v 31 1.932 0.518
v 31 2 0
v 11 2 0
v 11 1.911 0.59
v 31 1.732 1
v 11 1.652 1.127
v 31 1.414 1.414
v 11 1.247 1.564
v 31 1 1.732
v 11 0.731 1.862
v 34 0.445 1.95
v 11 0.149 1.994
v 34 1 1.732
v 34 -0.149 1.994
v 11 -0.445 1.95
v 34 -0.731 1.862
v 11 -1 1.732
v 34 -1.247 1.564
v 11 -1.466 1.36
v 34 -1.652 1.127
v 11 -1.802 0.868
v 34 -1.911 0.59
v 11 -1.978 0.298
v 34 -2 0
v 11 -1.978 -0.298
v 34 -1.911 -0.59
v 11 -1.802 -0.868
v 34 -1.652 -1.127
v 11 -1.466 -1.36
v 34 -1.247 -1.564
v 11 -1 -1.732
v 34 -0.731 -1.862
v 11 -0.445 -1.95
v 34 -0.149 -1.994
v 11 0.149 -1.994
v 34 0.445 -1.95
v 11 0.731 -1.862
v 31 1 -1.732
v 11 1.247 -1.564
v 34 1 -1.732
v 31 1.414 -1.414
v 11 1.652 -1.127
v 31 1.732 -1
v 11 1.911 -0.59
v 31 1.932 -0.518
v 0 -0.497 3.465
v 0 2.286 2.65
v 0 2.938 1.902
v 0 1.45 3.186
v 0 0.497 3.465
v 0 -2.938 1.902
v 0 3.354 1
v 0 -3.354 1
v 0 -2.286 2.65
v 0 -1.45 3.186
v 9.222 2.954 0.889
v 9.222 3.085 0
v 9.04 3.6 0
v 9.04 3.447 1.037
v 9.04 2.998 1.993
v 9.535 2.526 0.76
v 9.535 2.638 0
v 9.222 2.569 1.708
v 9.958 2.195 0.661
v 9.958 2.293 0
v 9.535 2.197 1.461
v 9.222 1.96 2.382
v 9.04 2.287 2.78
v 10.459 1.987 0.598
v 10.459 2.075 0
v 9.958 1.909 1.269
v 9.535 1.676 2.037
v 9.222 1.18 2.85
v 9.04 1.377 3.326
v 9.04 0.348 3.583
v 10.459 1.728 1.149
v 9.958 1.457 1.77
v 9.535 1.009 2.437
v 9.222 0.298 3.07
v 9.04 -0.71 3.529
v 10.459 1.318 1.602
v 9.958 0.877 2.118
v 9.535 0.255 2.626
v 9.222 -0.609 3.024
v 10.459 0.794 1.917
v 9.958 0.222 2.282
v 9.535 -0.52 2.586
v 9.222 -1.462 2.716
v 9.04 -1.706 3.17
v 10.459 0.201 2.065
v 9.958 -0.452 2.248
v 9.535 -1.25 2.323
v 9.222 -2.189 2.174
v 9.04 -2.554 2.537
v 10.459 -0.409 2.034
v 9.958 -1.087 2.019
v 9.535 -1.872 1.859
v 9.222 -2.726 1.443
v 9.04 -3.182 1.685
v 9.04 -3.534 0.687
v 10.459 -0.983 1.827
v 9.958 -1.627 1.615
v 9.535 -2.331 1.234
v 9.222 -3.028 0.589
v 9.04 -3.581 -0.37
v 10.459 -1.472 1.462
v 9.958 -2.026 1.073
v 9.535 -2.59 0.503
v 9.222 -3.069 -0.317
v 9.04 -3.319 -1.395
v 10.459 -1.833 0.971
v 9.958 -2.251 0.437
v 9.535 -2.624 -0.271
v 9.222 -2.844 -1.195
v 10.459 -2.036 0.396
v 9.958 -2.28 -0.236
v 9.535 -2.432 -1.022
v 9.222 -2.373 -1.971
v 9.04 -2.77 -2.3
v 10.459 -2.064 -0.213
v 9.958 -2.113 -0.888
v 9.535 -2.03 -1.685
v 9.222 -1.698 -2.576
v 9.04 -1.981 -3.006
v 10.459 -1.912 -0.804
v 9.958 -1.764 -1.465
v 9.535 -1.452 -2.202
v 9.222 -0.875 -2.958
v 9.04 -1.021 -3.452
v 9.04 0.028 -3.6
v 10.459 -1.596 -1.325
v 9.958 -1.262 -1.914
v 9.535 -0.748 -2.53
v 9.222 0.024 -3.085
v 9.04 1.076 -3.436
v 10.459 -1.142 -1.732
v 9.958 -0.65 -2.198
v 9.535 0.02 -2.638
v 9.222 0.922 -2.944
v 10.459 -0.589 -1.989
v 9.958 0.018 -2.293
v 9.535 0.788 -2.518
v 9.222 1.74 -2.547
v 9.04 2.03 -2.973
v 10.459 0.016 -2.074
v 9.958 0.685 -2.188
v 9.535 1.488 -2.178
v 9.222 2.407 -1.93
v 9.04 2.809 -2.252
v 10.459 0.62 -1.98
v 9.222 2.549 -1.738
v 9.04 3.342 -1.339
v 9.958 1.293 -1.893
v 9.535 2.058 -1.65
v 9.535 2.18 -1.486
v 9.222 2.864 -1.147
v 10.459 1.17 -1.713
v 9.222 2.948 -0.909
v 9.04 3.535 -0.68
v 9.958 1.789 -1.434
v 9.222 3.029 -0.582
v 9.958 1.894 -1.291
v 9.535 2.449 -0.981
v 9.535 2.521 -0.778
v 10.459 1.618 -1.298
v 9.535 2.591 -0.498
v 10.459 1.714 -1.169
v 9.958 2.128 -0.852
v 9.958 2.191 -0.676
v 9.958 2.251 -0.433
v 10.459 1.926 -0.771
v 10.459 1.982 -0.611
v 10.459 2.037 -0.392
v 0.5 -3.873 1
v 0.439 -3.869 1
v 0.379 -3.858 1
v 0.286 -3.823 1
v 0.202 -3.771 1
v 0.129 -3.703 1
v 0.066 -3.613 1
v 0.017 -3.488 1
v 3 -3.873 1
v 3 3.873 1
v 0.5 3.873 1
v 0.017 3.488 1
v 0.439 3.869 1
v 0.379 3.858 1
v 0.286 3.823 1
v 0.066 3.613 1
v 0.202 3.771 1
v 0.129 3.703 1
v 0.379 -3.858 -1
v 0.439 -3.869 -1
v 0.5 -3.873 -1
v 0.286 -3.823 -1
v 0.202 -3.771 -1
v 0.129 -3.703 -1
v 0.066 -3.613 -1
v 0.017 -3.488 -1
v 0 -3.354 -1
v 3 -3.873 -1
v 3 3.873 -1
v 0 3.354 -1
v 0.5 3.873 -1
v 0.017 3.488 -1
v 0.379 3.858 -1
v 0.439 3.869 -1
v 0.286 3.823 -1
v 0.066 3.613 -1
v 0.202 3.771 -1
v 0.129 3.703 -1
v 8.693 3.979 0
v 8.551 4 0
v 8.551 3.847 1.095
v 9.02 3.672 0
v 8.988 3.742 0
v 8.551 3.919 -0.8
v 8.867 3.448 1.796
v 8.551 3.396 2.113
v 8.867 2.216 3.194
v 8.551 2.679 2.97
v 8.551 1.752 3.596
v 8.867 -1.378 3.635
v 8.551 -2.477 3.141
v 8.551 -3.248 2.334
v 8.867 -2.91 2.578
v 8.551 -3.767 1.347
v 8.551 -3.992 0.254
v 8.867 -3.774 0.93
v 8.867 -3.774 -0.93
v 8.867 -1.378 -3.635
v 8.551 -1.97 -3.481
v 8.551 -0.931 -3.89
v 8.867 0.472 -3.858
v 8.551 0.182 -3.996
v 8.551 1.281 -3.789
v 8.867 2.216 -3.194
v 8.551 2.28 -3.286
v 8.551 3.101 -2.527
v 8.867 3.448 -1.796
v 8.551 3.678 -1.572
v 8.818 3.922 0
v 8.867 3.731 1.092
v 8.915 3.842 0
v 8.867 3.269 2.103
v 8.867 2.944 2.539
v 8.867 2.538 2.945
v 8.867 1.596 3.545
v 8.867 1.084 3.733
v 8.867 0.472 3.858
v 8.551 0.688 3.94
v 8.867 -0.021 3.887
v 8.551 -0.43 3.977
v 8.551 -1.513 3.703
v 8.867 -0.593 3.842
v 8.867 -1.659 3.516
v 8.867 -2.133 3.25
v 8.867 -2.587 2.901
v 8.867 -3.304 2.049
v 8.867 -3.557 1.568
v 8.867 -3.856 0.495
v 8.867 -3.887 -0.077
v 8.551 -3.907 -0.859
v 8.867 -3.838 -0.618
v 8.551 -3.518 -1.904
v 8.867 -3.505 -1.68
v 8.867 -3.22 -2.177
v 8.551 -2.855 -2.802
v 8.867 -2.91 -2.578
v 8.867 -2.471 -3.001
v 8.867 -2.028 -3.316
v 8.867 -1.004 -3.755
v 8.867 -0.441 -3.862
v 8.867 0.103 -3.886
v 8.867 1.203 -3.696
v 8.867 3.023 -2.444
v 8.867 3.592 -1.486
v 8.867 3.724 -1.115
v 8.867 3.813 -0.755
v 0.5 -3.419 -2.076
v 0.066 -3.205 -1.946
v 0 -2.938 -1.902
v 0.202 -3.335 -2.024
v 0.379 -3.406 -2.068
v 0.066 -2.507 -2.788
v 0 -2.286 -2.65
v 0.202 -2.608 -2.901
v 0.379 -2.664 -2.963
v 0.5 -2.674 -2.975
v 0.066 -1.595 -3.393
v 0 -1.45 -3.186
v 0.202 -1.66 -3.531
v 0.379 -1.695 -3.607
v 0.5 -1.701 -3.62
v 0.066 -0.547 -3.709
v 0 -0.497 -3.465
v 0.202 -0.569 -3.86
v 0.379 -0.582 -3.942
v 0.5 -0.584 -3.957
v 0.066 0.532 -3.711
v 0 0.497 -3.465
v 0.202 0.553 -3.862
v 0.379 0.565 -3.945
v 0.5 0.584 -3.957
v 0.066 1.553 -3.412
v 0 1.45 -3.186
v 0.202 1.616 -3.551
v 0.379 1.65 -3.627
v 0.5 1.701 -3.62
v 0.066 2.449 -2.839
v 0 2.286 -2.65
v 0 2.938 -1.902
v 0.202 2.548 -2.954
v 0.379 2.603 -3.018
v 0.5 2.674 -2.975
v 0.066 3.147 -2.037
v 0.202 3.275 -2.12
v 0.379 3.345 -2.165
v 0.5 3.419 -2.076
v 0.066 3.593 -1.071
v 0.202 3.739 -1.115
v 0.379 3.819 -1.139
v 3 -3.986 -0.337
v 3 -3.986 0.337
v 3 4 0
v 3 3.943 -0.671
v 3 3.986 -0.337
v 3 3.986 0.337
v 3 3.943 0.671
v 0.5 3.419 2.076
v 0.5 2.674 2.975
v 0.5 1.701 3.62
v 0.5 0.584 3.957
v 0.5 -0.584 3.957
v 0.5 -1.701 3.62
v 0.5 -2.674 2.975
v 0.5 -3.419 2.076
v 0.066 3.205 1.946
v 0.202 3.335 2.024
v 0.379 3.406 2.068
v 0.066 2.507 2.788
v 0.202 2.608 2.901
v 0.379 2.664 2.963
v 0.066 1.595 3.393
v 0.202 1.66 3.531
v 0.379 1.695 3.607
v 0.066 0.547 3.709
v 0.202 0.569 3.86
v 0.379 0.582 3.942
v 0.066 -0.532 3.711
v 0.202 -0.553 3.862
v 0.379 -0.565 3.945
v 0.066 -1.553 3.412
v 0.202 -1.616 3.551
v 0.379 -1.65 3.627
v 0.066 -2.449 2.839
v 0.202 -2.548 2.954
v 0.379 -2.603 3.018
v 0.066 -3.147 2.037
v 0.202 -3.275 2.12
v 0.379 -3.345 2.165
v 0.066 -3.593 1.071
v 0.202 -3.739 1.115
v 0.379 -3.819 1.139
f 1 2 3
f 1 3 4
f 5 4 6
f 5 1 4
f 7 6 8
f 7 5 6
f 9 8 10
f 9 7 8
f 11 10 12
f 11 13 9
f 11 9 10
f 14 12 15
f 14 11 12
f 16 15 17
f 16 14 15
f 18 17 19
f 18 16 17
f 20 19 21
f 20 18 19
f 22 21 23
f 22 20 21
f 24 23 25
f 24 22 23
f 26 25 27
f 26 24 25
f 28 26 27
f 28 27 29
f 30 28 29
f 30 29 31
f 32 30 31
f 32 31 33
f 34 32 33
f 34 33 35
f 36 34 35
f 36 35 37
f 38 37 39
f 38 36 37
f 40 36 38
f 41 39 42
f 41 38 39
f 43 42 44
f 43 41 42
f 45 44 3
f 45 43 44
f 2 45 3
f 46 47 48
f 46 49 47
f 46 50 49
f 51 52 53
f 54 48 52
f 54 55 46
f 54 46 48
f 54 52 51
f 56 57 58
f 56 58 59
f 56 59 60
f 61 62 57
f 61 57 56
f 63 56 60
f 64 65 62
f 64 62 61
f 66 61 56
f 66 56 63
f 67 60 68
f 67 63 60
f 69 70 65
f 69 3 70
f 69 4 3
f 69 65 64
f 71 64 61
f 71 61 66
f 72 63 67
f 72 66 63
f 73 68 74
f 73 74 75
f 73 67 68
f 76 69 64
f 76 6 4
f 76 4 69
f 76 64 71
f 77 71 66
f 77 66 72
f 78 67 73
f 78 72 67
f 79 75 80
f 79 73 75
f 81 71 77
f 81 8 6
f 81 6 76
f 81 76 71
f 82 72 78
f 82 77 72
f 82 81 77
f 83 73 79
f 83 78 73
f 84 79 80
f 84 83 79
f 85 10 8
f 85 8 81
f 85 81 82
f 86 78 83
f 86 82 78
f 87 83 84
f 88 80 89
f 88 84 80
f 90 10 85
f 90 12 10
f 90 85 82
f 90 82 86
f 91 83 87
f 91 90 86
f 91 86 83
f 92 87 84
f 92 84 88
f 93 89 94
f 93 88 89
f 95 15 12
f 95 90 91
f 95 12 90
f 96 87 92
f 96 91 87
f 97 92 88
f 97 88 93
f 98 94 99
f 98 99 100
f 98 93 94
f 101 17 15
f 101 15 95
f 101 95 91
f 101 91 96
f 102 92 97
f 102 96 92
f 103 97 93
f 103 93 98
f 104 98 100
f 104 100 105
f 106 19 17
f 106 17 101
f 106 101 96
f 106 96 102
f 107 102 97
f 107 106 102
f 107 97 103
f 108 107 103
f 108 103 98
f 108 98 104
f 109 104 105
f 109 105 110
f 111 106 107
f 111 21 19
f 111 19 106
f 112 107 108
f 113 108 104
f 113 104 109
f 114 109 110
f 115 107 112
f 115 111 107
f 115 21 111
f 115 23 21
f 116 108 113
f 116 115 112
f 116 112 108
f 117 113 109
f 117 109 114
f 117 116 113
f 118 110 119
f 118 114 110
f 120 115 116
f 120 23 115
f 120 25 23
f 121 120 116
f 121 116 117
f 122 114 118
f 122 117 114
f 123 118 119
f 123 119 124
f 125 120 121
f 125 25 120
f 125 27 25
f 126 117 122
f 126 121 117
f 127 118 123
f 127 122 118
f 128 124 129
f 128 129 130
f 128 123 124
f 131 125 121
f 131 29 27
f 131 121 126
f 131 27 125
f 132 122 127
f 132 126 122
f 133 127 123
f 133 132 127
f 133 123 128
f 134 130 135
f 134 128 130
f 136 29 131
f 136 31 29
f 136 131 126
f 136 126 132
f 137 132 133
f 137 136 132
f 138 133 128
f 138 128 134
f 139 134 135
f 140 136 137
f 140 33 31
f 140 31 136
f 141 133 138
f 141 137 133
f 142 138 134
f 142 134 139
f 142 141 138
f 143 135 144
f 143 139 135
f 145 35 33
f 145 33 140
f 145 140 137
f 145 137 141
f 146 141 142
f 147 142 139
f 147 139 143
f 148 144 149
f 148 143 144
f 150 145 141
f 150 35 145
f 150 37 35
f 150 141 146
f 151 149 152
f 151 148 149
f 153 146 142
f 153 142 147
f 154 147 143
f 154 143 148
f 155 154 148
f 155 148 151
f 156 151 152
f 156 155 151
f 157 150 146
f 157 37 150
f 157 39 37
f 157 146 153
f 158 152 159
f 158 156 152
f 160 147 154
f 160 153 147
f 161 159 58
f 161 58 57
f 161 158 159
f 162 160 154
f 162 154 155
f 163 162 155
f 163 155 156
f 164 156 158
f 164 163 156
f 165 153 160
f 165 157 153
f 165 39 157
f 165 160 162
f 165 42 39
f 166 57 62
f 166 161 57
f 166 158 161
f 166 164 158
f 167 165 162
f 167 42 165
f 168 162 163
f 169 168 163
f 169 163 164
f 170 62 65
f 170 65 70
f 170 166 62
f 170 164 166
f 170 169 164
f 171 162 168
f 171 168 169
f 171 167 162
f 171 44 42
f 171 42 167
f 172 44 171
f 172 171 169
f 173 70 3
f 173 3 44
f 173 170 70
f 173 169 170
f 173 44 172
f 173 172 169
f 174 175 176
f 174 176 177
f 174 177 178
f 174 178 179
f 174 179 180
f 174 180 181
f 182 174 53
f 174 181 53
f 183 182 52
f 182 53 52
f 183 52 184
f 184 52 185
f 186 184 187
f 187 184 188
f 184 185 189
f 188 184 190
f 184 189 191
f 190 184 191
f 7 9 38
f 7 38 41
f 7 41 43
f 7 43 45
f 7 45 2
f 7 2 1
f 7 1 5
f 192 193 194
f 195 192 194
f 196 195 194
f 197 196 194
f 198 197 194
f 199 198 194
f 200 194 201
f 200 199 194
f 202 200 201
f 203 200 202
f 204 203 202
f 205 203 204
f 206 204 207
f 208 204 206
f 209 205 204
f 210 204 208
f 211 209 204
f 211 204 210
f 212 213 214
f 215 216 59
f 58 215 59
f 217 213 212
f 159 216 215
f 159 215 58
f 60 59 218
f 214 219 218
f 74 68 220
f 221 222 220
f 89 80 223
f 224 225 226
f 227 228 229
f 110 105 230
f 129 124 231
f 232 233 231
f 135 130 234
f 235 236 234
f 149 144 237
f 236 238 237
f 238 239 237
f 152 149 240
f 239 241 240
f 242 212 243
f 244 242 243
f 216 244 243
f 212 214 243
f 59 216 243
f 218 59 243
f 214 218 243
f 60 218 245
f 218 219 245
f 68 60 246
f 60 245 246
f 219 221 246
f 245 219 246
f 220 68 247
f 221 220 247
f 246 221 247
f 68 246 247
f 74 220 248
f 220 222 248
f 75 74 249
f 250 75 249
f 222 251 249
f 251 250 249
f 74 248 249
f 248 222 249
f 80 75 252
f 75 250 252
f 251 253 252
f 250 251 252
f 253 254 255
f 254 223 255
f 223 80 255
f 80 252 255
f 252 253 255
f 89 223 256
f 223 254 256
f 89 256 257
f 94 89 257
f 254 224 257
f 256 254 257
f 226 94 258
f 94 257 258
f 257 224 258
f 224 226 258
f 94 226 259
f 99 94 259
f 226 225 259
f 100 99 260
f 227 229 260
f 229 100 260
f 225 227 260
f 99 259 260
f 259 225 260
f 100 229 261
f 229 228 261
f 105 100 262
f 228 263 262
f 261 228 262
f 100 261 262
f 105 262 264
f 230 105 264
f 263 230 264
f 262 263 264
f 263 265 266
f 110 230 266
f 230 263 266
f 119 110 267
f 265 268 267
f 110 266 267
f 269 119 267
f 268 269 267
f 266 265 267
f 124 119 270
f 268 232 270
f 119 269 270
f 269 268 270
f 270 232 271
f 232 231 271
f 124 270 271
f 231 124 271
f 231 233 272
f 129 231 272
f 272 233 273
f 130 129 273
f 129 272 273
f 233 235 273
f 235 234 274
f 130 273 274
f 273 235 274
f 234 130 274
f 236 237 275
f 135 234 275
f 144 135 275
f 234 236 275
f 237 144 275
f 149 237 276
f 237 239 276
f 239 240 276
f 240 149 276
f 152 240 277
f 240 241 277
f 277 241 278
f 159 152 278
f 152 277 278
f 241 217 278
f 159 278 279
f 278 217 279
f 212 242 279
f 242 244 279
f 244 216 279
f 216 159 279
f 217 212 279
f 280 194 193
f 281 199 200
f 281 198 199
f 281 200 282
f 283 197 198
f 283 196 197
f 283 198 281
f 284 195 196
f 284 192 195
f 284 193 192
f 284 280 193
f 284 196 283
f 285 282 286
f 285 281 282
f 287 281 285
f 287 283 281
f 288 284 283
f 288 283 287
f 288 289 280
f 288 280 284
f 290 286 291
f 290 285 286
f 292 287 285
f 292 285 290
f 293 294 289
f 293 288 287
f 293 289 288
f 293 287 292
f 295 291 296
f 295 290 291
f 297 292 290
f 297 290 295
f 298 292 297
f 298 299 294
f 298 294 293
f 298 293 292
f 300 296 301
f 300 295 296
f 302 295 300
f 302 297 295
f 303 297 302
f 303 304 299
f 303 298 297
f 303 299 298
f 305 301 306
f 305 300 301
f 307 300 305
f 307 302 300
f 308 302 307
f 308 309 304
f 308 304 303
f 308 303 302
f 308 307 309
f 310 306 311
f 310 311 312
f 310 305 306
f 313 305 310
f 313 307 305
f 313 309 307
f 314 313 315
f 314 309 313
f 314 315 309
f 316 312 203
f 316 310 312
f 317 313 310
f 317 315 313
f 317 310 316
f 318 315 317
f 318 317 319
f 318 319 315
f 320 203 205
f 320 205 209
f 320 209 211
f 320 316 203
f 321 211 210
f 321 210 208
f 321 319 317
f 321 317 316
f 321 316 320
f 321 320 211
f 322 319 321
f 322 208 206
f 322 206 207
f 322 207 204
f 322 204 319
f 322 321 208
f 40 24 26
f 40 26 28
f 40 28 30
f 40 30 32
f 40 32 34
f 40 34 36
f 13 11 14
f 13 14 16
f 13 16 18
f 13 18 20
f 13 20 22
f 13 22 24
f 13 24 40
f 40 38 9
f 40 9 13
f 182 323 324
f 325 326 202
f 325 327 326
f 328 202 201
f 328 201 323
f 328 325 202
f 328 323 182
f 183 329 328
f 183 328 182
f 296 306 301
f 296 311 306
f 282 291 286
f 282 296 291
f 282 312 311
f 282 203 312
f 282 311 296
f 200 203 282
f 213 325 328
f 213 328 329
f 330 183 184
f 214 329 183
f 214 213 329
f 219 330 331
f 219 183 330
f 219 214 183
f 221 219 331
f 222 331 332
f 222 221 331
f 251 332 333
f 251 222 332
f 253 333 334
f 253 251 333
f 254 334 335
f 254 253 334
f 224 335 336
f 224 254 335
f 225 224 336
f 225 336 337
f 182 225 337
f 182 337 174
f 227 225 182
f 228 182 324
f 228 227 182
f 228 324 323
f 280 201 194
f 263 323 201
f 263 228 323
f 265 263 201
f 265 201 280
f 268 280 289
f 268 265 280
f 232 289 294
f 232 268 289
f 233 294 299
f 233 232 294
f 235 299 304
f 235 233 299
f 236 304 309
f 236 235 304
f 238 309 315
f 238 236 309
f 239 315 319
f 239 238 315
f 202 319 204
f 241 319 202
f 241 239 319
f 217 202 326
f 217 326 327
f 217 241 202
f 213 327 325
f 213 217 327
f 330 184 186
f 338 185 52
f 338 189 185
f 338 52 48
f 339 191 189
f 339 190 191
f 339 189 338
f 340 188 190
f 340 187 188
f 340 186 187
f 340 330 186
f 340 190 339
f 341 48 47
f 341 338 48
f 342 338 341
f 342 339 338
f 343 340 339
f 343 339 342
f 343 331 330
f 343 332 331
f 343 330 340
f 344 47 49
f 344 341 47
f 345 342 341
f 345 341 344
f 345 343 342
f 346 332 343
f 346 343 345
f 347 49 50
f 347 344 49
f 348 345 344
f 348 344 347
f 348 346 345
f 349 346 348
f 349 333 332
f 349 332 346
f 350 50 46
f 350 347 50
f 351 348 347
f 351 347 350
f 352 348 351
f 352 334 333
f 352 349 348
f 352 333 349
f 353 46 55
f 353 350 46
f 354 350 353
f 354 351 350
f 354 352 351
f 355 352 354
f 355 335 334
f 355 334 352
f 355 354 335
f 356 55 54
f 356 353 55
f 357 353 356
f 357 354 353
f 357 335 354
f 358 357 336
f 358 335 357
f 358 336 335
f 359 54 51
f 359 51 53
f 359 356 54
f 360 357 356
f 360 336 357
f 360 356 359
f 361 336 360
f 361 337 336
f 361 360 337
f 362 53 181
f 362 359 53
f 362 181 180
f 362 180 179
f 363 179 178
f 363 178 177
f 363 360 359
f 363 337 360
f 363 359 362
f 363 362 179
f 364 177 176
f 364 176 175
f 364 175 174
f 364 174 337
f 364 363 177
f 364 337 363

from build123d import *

# Parameters (mm, degrees)
SKETCH2_W          = 2
SKETCH2_H          = 8
CUT_EXTRUDE1_DEPTH = 3
FILLET1_R          = 0.5
SKETCH3_W          = 3
SKETCH3_H          = 1
CUT_EXTRUDE2_DEPTH = 4


with BuildPart() as part:
    # Sketch1 → Revolve1 (revolve)
    with BuildSketch(Plane.XY):
        with BuildLine():
            Line((0, 0), (0, 4))
            Line((0, 4), (9, 4))
            ThreePointArc((9, 4), (9.585786438, 2.585786438), (11, 2))
            Line((11, 2), (34, 2))
            Line((34, 2), (34, 0))
            Line((34, 0), (0, 0))
        make_face()
    revolve(axis=Axis((0, 0, 0), (1, 0, 0)))

    # Sketch2 → Cut-Extrude1 (cut)
    with BuildSketch(Plane.ZY):
        Rectangle(SKETCH2_W, SKETCH2_H)
    extrude(amount=-CUT_EXTRUDE1_DEPTH, mode=Mode.SUBTRACT)

    # Fillet1
    fillet1_edges = [part.edges().sort_by_distance(p)[0] for p in [
        (0, 0, -4),
        (0, 0, 4),
        (9, -4, 0),
    ]]
    fillet(fillet1_edges, radius=FILLET1_R)

    # Sketch3 → Cut-Extrude2 (cut, symmetric)
    with BuildSketch(Plane.XY):
        with Locations((32.5, 1.5)):
            Rectangle(SKETCH3_W, SKETCH3_H)
    extrude(amount=CUT_EXTRUDE2_DEPTH, both=True, mode=Mode.SUBTRACT)


solid = part.part
